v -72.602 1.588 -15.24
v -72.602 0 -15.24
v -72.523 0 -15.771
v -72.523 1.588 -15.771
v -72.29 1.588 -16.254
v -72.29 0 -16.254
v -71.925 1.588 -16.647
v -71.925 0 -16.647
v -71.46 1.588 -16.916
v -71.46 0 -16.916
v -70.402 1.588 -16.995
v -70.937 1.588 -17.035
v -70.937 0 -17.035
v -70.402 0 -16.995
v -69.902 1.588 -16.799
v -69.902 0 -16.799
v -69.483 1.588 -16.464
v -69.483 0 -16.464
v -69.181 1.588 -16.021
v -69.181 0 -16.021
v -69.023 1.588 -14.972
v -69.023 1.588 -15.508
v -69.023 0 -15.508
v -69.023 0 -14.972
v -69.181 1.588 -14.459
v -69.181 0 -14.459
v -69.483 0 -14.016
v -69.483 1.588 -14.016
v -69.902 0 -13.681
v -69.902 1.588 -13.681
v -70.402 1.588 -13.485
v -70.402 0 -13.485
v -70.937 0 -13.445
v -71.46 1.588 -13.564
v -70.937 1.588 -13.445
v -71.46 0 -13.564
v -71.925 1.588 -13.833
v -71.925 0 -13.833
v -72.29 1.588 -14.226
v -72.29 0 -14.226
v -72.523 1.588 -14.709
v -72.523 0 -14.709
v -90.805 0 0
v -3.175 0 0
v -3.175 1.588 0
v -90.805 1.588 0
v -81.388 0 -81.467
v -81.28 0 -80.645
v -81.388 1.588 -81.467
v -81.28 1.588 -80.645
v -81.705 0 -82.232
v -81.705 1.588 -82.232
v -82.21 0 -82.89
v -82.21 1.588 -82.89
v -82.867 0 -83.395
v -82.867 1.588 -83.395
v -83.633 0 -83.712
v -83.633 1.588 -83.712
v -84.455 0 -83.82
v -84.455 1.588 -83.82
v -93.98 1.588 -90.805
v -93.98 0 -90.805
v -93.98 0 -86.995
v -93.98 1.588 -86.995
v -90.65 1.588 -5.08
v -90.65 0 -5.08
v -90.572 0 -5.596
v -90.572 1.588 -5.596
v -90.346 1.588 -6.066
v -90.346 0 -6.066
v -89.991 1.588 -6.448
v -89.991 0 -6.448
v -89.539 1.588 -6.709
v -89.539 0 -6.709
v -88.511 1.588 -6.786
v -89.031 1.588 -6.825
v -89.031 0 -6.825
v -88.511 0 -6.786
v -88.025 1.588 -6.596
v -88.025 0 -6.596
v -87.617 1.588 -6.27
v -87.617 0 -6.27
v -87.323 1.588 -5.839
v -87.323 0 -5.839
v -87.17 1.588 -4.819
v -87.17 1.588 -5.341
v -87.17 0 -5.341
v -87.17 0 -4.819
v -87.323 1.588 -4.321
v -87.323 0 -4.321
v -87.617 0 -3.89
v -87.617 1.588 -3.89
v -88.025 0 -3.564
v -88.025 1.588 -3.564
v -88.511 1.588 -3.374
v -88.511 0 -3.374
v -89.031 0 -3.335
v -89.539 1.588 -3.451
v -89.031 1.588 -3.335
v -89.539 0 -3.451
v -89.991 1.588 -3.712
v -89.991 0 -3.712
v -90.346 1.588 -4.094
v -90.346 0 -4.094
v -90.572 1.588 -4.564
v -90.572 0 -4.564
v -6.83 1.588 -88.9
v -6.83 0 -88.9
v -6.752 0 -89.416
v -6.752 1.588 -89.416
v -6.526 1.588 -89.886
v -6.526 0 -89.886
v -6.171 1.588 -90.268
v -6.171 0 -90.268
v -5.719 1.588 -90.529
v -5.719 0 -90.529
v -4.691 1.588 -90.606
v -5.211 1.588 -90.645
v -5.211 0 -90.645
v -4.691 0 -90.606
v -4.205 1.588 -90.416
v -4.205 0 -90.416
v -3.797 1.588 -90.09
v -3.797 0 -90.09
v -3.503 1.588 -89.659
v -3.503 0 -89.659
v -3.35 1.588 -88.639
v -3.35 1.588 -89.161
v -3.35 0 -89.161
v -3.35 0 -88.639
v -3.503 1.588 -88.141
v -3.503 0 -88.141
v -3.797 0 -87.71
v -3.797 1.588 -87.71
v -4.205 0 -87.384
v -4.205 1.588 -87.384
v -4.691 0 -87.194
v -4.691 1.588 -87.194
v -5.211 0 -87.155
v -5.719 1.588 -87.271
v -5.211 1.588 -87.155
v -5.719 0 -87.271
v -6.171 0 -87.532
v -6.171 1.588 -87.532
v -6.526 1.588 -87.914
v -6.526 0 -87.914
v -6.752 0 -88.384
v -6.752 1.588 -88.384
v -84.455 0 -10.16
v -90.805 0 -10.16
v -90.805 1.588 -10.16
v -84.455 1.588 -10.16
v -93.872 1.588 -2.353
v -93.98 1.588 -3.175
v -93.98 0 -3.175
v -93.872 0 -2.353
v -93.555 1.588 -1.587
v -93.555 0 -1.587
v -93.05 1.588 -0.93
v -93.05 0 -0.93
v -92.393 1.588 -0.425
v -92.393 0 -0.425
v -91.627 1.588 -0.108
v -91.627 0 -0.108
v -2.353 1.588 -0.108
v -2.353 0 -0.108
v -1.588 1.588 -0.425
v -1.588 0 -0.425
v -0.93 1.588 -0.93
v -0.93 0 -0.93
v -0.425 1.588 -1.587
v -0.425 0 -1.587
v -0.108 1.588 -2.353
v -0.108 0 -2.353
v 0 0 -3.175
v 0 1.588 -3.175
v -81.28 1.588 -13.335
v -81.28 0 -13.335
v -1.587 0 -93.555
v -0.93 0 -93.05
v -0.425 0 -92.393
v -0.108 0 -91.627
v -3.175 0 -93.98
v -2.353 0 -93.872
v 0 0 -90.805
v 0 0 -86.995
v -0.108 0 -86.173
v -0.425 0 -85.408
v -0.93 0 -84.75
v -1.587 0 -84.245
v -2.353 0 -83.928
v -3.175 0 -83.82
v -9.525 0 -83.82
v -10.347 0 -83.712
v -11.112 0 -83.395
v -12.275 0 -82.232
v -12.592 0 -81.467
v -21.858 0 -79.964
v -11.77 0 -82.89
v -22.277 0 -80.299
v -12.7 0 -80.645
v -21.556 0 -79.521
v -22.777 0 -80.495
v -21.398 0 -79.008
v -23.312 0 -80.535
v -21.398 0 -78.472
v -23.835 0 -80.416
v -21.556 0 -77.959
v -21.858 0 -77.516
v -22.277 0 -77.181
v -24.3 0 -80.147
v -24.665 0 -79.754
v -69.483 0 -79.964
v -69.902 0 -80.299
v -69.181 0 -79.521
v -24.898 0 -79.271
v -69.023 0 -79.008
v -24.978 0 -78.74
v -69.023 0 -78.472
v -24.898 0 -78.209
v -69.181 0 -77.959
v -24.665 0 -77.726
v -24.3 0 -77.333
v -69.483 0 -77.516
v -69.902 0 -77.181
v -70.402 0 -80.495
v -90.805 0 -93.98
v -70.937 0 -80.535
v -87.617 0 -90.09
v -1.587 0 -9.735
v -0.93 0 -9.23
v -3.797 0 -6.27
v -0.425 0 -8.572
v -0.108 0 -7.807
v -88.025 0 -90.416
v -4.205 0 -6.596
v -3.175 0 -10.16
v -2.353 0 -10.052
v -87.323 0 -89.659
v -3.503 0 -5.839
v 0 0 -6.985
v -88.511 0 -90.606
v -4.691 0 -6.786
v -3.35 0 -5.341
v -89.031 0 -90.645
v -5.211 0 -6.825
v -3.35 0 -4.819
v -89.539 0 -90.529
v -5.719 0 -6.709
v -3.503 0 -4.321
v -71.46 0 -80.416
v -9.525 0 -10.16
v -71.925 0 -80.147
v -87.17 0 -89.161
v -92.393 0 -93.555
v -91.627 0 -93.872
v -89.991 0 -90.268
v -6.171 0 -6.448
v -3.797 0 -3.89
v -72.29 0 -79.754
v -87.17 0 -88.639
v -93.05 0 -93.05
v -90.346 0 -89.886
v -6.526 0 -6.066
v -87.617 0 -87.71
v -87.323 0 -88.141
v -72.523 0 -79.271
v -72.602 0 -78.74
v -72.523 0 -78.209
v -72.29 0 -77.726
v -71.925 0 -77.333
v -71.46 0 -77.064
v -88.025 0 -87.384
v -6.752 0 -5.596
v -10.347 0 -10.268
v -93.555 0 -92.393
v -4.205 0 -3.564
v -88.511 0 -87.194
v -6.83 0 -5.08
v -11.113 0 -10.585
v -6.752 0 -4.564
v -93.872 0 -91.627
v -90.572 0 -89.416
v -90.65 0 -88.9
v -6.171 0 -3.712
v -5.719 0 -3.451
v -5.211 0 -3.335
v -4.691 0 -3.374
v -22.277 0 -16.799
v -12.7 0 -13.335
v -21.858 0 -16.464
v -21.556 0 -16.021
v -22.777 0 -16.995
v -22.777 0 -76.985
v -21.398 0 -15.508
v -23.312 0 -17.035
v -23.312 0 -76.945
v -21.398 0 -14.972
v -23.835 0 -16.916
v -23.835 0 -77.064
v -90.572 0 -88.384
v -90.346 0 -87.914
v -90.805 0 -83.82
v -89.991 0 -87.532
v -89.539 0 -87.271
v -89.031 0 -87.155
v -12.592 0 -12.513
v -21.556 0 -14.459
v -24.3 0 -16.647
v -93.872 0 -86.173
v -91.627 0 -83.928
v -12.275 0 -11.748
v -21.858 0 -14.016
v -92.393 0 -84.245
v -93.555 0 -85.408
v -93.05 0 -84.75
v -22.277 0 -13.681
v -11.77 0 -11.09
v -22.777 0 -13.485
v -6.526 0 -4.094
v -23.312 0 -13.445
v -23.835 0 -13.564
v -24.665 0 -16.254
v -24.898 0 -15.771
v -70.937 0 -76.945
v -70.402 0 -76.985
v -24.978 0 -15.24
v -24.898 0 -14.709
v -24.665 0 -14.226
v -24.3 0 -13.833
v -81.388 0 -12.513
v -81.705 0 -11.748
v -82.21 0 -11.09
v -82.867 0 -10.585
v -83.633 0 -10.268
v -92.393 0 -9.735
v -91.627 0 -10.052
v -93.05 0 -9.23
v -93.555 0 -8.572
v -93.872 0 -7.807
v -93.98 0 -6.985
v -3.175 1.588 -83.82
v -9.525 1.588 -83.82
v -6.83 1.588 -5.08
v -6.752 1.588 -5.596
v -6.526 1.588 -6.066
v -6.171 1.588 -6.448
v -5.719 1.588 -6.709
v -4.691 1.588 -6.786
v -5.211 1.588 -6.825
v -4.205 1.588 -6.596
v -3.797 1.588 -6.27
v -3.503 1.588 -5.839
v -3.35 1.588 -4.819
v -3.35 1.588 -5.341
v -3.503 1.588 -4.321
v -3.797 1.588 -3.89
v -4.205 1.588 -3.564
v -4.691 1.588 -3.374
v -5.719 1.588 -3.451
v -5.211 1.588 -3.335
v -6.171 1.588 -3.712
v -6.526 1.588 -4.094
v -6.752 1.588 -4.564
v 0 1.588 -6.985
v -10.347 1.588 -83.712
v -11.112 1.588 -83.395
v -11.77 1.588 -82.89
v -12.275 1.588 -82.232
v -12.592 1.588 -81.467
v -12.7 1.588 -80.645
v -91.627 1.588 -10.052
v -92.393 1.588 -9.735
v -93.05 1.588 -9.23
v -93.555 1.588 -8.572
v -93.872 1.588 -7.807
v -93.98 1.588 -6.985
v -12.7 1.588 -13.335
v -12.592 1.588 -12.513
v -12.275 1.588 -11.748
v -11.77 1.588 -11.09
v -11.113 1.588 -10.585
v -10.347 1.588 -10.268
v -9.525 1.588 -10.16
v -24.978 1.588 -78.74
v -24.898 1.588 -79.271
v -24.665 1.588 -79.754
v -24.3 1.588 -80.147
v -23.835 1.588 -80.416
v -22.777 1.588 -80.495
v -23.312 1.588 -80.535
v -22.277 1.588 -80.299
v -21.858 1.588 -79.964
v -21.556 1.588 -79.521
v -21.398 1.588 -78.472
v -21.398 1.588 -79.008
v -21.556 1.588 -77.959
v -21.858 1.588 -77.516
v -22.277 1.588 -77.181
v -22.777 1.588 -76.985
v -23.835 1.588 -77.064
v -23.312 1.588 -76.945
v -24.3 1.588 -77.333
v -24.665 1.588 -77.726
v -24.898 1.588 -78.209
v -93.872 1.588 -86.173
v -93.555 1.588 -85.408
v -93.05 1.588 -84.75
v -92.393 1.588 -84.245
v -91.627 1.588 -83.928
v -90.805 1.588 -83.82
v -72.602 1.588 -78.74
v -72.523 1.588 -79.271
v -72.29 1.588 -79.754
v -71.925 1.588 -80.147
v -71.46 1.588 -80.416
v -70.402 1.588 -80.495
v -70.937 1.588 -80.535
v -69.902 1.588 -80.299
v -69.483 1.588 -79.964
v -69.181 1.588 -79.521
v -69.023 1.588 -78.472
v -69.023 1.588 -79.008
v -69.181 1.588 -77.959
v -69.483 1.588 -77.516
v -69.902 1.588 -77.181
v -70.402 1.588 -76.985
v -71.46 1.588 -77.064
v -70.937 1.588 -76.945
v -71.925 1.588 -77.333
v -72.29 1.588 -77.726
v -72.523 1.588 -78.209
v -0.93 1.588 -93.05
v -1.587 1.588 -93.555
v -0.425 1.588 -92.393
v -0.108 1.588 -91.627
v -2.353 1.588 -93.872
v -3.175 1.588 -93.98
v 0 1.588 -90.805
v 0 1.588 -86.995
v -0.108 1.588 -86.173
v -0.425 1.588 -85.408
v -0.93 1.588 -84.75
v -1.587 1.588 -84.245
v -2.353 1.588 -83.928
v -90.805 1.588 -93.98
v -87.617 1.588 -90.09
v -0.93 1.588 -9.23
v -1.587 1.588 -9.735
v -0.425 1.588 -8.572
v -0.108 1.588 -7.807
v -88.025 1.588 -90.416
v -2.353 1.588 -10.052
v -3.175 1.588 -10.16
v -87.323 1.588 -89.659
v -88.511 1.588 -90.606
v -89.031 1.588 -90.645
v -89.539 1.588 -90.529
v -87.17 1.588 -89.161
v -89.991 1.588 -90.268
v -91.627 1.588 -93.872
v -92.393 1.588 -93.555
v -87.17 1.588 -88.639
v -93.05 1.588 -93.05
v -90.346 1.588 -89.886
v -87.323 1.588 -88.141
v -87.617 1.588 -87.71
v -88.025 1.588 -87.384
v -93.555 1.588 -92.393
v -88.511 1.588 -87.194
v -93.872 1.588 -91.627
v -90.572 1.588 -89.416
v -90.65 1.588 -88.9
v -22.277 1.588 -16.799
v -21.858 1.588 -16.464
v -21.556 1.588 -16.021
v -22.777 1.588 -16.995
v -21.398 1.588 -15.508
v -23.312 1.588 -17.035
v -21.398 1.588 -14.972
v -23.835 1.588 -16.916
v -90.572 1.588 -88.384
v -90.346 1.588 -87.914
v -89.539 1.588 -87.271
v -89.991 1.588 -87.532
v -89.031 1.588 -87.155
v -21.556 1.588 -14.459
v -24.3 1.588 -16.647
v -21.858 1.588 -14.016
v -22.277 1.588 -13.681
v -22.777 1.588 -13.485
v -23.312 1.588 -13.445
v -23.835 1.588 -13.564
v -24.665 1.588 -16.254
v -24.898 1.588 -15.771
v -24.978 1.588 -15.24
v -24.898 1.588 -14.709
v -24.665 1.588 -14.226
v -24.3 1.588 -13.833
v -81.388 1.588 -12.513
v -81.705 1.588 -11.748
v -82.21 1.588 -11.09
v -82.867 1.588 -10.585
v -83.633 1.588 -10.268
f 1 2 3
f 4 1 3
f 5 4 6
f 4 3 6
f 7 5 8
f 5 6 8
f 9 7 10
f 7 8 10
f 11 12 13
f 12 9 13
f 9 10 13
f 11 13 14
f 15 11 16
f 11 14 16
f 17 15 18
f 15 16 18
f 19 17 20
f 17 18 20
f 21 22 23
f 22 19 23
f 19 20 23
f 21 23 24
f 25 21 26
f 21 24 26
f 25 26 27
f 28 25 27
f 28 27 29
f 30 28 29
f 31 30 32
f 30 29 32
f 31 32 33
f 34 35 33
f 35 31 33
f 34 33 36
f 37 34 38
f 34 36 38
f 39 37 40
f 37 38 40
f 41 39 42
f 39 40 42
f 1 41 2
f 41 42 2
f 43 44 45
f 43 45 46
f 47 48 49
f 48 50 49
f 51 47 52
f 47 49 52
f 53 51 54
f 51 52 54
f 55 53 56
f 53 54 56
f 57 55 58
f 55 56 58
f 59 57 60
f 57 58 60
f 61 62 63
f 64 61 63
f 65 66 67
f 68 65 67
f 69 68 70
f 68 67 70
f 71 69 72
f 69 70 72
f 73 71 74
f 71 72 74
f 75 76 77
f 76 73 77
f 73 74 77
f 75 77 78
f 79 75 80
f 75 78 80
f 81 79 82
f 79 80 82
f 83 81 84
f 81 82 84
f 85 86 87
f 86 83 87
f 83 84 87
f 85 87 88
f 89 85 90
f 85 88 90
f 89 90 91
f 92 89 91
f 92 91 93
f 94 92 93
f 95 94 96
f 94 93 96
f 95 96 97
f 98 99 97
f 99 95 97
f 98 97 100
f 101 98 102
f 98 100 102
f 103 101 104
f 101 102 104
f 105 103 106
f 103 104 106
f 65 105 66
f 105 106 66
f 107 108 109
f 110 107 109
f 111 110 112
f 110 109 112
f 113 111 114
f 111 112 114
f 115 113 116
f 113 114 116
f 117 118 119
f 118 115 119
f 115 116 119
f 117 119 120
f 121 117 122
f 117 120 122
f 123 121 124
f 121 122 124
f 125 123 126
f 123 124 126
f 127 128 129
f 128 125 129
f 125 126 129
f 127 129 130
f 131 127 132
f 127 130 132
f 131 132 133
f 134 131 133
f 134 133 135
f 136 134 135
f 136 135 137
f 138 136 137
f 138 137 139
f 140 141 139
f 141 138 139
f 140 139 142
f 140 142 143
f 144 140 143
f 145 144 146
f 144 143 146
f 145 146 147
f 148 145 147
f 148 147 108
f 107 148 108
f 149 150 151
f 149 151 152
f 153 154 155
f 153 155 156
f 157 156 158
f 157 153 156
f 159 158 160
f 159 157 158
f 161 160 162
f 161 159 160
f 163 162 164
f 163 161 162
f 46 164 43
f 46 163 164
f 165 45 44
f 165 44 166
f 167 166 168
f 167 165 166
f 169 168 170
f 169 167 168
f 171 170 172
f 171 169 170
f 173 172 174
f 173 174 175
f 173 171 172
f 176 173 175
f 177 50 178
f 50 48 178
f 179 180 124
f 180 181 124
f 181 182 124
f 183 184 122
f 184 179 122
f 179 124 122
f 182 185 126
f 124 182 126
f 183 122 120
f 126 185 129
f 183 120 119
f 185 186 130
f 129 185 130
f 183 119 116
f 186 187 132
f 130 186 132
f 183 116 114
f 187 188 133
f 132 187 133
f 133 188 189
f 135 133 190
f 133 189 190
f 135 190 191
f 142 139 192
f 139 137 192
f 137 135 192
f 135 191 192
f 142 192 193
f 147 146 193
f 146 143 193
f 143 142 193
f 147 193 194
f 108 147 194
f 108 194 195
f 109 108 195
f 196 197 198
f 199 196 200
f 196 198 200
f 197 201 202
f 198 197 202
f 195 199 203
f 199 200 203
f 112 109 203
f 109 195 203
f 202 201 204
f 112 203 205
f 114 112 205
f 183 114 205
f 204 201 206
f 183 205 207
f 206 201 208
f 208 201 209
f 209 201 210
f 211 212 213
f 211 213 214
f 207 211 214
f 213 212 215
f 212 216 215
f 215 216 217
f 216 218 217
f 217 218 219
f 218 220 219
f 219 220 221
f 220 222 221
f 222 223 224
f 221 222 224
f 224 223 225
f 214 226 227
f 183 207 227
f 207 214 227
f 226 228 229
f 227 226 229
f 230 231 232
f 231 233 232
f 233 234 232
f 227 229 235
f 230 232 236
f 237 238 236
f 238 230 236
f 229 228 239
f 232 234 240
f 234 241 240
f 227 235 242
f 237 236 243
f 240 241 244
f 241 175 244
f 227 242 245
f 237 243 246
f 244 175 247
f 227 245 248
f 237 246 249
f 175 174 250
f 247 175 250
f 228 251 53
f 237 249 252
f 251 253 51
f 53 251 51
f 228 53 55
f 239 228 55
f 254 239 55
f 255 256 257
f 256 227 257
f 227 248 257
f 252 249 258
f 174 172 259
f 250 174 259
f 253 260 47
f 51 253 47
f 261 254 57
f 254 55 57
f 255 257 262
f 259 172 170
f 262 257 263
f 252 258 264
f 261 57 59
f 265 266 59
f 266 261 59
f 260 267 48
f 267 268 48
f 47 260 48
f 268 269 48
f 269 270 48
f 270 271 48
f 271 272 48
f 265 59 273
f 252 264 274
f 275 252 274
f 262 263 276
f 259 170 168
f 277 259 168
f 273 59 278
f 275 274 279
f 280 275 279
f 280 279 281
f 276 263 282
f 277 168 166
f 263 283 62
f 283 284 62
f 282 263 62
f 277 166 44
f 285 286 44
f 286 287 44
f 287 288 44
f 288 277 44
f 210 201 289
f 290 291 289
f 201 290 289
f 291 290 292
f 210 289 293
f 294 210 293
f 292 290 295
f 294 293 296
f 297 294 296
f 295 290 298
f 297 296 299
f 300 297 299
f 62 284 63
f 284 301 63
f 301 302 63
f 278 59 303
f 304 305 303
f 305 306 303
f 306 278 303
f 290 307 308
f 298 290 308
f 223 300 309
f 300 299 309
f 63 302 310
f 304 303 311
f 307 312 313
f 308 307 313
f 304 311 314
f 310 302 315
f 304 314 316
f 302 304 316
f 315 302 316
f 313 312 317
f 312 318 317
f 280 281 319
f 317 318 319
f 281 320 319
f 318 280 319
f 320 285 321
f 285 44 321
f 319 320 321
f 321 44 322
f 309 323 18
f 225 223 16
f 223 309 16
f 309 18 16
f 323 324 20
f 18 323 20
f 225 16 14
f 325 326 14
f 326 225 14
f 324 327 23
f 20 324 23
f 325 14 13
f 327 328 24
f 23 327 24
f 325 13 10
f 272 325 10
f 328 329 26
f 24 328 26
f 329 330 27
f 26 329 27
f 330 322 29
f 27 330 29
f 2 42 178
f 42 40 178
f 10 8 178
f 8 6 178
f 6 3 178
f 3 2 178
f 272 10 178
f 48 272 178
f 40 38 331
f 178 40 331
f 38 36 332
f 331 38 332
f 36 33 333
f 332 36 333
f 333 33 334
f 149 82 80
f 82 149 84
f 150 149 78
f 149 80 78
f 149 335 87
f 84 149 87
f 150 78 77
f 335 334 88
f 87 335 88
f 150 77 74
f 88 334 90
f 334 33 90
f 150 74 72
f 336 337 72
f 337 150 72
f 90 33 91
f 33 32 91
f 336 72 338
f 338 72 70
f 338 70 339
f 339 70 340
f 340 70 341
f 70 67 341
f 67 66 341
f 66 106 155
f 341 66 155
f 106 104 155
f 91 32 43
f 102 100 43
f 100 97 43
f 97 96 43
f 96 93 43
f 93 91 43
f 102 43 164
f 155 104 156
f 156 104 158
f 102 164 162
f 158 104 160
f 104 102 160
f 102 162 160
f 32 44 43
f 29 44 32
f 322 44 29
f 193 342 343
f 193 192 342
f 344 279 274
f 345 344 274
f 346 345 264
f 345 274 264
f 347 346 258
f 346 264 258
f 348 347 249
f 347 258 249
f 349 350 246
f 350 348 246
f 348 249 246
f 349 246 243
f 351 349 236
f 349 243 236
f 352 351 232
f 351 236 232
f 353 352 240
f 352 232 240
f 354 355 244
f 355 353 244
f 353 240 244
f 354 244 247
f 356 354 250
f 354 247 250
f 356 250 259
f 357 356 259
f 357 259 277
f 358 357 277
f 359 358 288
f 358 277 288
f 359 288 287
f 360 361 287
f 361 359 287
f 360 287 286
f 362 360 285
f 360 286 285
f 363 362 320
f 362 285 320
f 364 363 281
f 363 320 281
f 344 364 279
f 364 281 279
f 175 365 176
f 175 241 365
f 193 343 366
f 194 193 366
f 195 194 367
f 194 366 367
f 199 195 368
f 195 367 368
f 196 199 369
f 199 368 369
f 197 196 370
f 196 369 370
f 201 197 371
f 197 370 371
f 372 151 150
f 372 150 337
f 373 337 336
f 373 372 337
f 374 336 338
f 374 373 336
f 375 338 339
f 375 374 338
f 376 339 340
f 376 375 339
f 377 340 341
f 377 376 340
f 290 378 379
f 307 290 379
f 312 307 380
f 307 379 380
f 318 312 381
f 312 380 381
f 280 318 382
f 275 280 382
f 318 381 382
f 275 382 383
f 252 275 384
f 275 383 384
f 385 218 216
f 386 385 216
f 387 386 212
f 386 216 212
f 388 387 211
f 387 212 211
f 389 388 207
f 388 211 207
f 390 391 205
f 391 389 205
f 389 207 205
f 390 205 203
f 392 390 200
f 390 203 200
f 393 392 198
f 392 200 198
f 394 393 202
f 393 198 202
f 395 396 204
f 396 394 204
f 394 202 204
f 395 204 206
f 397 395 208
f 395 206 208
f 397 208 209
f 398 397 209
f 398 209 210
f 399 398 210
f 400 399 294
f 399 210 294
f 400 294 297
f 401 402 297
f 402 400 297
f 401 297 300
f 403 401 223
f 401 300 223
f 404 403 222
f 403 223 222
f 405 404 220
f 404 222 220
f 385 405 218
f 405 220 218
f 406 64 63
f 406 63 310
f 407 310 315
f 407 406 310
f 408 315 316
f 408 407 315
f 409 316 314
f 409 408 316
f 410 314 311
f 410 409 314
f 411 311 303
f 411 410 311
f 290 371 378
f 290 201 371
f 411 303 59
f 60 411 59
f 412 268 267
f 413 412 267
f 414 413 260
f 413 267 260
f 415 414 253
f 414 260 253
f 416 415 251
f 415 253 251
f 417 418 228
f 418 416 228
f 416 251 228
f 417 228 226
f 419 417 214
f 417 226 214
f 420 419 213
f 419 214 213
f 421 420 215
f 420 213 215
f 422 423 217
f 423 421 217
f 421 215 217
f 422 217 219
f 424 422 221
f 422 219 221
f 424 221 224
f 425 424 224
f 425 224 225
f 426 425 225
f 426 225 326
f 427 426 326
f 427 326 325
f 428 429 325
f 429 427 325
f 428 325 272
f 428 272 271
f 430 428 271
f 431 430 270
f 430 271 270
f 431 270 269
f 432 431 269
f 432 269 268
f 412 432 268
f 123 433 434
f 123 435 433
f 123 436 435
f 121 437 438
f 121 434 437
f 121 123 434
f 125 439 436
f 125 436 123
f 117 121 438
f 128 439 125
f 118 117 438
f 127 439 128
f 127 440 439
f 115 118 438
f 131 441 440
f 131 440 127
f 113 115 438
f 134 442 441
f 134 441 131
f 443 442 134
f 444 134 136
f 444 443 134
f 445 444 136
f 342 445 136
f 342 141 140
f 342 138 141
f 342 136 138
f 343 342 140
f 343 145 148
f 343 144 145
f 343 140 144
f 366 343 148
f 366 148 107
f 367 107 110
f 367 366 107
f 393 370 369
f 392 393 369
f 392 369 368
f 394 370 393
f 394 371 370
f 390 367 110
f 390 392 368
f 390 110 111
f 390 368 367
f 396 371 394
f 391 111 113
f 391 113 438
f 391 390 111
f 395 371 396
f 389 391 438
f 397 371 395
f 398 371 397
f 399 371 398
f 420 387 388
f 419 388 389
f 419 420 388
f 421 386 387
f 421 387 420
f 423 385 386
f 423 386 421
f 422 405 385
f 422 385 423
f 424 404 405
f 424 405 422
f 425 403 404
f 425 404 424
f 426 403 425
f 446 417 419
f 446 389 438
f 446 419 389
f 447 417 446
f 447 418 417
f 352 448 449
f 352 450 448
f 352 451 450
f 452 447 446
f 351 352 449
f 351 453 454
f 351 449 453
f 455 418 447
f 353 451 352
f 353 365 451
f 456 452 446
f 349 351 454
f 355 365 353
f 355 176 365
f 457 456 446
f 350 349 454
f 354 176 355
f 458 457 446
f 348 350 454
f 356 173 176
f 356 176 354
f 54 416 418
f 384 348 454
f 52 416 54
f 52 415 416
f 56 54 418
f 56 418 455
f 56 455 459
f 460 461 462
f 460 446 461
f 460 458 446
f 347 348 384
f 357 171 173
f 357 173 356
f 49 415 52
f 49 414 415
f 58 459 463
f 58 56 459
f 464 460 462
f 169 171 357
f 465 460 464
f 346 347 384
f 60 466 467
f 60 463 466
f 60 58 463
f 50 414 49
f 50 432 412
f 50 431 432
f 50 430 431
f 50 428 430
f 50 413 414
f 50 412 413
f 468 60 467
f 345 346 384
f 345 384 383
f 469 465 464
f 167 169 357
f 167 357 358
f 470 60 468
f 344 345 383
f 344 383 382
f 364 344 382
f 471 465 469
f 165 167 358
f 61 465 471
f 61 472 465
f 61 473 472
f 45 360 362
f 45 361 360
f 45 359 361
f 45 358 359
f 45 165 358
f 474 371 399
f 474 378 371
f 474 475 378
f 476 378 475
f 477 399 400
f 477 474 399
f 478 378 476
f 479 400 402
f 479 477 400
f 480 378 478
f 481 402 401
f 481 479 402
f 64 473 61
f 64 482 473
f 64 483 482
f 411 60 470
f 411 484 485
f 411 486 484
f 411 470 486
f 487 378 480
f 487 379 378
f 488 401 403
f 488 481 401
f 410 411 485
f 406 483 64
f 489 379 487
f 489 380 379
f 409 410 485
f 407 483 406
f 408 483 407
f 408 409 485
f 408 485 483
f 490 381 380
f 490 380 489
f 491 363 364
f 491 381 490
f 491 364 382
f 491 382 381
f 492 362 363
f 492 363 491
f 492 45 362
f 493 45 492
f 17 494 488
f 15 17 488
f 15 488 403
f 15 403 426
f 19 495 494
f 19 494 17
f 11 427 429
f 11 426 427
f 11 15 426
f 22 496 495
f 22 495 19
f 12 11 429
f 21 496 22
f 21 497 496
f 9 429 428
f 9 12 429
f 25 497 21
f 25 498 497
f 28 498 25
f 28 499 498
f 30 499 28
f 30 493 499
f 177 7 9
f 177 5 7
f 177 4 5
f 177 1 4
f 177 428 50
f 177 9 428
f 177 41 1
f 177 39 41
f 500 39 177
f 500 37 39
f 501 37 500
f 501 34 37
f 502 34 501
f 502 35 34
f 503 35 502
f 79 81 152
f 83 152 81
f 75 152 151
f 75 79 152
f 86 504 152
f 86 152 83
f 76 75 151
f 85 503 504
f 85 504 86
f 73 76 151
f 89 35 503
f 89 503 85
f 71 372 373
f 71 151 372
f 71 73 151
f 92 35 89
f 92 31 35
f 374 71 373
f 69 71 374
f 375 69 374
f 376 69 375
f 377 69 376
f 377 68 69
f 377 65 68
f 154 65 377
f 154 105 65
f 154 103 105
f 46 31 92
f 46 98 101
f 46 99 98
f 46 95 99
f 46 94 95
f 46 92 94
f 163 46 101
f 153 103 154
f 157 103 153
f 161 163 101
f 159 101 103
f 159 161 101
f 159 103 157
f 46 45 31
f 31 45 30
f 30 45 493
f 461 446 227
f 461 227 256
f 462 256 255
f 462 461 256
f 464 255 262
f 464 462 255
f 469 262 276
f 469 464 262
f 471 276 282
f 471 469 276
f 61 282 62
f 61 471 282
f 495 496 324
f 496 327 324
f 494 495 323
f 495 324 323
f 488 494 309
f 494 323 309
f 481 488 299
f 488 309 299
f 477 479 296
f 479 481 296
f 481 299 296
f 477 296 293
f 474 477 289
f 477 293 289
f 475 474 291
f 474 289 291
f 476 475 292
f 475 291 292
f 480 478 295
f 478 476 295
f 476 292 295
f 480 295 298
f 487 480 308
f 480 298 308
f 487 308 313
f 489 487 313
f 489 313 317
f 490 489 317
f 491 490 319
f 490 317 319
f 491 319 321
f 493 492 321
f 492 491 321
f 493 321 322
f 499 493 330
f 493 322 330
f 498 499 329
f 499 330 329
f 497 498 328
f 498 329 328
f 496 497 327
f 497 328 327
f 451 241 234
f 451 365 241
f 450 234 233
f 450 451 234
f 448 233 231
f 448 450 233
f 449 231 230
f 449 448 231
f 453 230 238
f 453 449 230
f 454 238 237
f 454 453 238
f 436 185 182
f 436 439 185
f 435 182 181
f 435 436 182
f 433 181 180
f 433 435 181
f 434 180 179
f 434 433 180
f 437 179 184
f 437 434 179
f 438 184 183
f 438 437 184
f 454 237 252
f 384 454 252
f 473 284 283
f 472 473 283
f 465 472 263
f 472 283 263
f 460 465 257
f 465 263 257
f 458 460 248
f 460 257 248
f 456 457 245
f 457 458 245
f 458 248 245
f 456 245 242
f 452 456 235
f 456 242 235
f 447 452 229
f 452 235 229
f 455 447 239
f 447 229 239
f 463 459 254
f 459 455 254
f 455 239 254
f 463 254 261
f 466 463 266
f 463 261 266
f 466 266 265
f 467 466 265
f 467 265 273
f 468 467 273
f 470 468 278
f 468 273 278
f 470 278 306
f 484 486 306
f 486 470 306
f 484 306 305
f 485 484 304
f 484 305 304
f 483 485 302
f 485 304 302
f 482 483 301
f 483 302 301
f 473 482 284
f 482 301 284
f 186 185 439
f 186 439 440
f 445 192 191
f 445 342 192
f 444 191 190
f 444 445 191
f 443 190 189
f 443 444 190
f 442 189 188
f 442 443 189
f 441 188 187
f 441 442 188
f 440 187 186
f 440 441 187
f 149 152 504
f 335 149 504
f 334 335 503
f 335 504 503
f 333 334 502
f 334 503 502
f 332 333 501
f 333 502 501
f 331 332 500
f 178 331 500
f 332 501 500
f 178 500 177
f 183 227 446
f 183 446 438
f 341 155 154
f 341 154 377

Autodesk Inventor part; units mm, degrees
ref_plane "YZ Plane" through (0, 0, 0) normal (1, 0, 0) x (0, 1, 0)
ref_plane "XZ Plane" through (0, 0, 0) normal (0, 1, 0) x (-1, 0, 0)
ref_plane "XY Plane" through (0, 0, 0) normal (0, 0, 1) x (1, 0, 0)
sketch "Sketch1" plane through (0, 0, 0) normal (0, 1, 0) x (-1, 0, 0)
  line L0 (0, 0) -> (93.98, 0)
  line L1 (93.98, -93.98) -> (0, -93.98)
  circle A0 centre (88.9, -5.08) radius 1.75
  circle A1 centre (5.08, -5.08) radius 1.75
  circle A2 centre (5.08, -88.9) radius 1.75
  circle A3 centre (88.9, -88.9) radius 1.75
  circle A4 centre (23.1775, -78.74) radius 1.8
  circle A5 centre (23.1775, -78.74) radius 1.8
  circle A6 centre (70.8025, -78.74) radius 1.8
  circle A7 centre (70.8025, -78.74) radius 1.8
  circle A8 centre (70.8025, -15.24) radius 1.8
  circle A9 centre (70.8025, -15.24) radius 1.8
  circle A10 centre (23.1775, -15.24) radius 1.8
  circle A11 centre (23.1775, -15.24) radius 1.8
  line L2 (93.98, 0) -> (93.98, -10.16)
  line L3 (93.98, -10.16) -> (81.28, -10.16)
  line L4 (93.98, -93.98) -> (93.98, -83.82)
  line L5 (93.98, -83.82) -> (81.28, -83.82)
  line L6 (81.28, -83.82) -> (81.28, -10.16)
  line L7 (0, -10.16) -> (12.7, -10.16)
  line L8 (0, -83.82) -> (12.7, -83.82)
  line L9 (12.7, -83.82) -> (12.7, -10.16)
  line L10 (93.98, 0) -> (93.98, -10.16)
  line L11 (93.98, -83.82) -> (93.98, -93.98)
  line L12 (0, -93.98) -> (0, -83.82)
  line L13 (0, -10.16) -> (0, 0)
extrude "Extrusion1" add sketch "Sketch1" along normal blind 1.5875
fillet "Fillet1" radius 3.175 12 edges at (0, 0.7937, 0) (0, 0.7937, -10.16) (-12.7, 0.7937, -10.16) (-12.7, 0.7937, -83.82) (0, 0.7937, -83.82) (0, 0.7937, -93.98) (-93.98, 0.7937, 0) (-93.98, 0.7937, -10.16) (-81.28, 0.7937, -10.16) (-81.28, 0.7937, -83.82) (-93.98, 0.7937, -83.82) (-93.98, 0.7937, -93.98)
properties part number "ethernetPlate"
